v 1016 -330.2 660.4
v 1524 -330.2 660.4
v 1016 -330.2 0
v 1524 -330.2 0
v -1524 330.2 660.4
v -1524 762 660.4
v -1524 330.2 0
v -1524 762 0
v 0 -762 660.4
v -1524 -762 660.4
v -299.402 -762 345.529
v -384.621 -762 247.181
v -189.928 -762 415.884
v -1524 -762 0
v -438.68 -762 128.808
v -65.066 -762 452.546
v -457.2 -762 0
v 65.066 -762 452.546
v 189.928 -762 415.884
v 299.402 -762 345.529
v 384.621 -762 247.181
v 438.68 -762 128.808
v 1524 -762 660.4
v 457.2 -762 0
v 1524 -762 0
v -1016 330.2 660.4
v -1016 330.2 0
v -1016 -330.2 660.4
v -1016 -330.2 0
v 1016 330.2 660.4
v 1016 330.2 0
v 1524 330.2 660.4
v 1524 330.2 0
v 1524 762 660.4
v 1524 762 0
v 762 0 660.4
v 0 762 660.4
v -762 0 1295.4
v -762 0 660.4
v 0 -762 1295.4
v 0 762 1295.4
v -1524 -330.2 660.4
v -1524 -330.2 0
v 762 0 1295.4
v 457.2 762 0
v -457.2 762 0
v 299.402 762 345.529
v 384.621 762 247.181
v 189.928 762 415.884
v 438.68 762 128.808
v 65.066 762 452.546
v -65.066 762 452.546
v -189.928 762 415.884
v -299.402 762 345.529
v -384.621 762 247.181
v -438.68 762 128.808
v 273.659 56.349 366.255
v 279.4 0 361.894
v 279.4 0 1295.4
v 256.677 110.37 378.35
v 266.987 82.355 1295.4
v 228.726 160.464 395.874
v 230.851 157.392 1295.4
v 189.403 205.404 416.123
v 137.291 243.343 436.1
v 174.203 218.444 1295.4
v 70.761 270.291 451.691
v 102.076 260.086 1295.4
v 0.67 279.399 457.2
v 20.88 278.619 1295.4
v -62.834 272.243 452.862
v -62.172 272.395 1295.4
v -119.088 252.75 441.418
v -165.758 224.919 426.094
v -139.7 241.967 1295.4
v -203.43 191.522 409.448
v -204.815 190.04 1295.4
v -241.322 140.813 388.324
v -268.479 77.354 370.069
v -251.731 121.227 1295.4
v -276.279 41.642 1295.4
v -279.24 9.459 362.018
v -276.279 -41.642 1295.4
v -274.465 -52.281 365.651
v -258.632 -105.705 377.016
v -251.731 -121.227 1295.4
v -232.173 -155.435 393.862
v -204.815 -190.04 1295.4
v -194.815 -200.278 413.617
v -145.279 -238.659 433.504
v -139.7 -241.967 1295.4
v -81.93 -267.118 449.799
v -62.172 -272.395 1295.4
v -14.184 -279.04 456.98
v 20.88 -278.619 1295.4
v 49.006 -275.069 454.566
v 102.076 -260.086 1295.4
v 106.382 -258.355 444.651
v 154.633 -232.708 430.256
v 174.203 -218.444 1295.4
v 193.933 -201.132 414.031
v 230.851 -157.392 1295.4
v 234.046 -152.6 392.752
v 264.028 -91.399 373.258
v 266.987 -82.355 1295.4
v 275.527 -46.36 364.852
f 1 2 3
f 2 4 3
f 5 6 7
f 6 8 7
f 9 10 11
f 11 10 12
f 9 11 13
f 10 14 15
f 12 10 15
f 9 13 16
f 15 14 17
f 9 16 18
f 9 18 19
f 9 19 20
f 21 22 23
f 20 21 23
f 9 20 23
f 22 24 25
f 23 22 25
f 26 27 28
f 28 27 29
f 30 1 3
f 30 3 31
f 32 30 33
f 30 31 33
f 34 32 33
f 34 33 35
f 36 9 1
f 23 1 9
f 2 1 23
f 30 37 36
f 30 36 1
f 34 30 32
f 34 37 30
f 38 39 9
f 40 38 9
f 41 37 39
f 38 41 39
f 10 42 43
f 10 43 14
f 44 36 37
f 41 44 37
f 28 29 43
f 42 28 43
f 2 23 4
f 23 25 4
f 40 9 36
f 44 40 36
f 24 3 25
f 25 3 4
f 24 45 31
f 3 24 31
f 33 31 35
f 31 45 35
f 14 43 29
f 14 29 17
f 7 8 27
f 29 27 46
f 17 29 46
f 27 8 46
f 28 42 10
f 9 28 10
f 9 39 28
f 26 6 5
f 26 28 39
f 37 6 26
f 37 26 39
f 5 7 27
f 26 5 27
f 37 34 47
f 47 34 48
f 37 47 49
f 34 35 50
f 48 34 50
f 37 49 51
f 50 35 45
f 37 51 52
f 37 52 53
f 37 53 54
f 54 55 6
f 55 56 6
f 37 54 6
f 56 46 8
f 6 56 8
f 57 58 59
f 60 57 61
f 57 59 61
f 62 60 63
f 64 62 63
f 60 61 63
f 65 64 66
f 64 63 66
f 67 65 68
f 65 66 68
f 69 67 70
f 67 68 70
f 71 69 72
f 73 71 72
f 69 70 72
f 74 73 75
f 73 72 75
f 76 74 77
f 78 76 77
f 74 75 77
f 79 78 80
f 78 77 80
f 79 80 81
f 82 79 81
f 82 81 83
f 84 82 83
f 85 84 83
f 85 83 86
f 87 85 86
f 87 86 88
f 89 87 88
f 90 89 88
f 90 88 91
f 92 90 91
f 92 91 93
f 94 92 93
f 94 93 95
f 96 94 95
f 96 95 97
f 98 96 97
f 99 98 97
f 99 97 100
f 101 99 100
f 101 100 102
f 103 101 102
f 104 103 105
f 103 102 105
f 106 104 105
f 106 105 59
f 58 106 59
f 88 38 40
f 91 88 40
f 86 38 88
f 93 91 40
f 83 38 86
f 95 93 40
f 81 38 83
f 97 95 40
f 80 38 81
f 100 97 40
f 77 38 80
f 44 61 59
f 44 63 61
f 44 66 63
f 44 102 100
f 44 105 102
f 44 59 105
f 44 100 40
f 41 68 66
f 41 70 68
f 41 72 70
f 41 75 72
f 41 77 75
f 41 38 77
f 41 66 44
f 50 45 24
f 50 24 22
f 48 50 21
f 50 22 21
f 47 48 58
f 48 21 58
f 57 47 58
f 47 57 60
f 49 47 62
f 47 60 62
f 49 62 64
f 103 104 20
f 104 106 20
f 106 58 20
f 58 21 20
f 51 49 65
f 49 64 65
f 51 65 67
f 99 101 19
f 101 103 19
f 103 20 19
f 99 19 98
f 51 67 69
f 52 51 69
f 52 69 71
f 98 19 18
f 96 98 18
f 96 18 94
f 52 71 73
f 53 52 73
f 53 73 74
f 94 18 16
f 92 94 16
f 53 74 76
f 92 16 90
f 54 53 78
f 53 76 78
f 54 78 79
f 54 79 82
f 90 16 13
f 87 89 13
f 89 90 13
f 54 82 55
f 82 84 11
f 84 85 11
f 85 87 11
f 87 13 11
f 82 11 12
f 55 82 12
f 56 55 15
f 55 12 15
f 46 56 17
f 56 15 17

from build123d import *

# Parameters (mm, degrees)
F0_W      = 3048
F0_H      = 1524
F1_DEPTH  = 635
F2_W      = 1016
F2_H      = 660.4
F3_DEPTH  = 635.001
F4_W      = 1016
F4_H      = 660.4
F5_DEPTH  = 635.001
F6_DEPTH  = 25.4
F8_DEPTH  = 635
F9_R      = 279.4
F10_DEPTH = 1295.401
F11_R     = 457.2
F12_DEPTH = 1524.001


with BuildPart() as f1:
    # F0 (on Top) → F1 (new body)
    with BuildSketch(Plane.XY):
        Rectangle(F0_W, F0_H)
    extrude(amount=F1_DEPTH)

    # F2 (on face) → F3 (cut, through all)
    with BuildSketch(Plane.XY.offset(635)):
        with Locations((-1524, 0)):
            Rectangle(F2_W, F2_H)
    extrude(amount=-F3_DEPTH, mode=Mode.SUBTRACT)

    # F4 (on face) → F5 (cut, through all)
    with BuildSketch(Plane.XY.offset(635)):
        with Locations((1524, 0)):
            Rectangle(F4_W, F4_H)
    extrude(amount=-F5_DEPTH, mode=Mode.SUBTRACT)

    # F1_face (on face) → F6 (join)
    with BuildSketch(Plane.XY.offset(635)):
        Polygon((-1016, -330.2), (-1524, -330.2), (-1524, -762), (1524, -762), (1524, -330.2), (1016, -330.2), (1016, 330.2), (1524, 330.2), (1524, 762), (-1524, 762), (-1524, 330.2), (-1016, 330.2), align=None)
    extrude(amount=F6_DEPTH)

    # F7 (on face) → F8 (join)
    with BuildSketch(Plane.XY.offset(660.4)):
        Polygon((762, 0), (0, 762), (-762, 0), (0, -762), align=None)
    extrude(amount=F8_DEPTH)

    # F9 (on face) → F10 (cut, through all)
    with BuildSketch(Plane.XY.offset(1295.4)):
        Circle(F9_R)
    extrude(amount=-F10_DEPTH, mode=Mode.SUBTRACT)

    # F11 (on face) → F12 (cut, through all)
    with BuildSketch(Plane.XZ.offset(762)):
        Circle(F11_R)
    extrude(amount=-F12_DEPTH, mode=Mode.SUBTRACT)


solid = f1.part
